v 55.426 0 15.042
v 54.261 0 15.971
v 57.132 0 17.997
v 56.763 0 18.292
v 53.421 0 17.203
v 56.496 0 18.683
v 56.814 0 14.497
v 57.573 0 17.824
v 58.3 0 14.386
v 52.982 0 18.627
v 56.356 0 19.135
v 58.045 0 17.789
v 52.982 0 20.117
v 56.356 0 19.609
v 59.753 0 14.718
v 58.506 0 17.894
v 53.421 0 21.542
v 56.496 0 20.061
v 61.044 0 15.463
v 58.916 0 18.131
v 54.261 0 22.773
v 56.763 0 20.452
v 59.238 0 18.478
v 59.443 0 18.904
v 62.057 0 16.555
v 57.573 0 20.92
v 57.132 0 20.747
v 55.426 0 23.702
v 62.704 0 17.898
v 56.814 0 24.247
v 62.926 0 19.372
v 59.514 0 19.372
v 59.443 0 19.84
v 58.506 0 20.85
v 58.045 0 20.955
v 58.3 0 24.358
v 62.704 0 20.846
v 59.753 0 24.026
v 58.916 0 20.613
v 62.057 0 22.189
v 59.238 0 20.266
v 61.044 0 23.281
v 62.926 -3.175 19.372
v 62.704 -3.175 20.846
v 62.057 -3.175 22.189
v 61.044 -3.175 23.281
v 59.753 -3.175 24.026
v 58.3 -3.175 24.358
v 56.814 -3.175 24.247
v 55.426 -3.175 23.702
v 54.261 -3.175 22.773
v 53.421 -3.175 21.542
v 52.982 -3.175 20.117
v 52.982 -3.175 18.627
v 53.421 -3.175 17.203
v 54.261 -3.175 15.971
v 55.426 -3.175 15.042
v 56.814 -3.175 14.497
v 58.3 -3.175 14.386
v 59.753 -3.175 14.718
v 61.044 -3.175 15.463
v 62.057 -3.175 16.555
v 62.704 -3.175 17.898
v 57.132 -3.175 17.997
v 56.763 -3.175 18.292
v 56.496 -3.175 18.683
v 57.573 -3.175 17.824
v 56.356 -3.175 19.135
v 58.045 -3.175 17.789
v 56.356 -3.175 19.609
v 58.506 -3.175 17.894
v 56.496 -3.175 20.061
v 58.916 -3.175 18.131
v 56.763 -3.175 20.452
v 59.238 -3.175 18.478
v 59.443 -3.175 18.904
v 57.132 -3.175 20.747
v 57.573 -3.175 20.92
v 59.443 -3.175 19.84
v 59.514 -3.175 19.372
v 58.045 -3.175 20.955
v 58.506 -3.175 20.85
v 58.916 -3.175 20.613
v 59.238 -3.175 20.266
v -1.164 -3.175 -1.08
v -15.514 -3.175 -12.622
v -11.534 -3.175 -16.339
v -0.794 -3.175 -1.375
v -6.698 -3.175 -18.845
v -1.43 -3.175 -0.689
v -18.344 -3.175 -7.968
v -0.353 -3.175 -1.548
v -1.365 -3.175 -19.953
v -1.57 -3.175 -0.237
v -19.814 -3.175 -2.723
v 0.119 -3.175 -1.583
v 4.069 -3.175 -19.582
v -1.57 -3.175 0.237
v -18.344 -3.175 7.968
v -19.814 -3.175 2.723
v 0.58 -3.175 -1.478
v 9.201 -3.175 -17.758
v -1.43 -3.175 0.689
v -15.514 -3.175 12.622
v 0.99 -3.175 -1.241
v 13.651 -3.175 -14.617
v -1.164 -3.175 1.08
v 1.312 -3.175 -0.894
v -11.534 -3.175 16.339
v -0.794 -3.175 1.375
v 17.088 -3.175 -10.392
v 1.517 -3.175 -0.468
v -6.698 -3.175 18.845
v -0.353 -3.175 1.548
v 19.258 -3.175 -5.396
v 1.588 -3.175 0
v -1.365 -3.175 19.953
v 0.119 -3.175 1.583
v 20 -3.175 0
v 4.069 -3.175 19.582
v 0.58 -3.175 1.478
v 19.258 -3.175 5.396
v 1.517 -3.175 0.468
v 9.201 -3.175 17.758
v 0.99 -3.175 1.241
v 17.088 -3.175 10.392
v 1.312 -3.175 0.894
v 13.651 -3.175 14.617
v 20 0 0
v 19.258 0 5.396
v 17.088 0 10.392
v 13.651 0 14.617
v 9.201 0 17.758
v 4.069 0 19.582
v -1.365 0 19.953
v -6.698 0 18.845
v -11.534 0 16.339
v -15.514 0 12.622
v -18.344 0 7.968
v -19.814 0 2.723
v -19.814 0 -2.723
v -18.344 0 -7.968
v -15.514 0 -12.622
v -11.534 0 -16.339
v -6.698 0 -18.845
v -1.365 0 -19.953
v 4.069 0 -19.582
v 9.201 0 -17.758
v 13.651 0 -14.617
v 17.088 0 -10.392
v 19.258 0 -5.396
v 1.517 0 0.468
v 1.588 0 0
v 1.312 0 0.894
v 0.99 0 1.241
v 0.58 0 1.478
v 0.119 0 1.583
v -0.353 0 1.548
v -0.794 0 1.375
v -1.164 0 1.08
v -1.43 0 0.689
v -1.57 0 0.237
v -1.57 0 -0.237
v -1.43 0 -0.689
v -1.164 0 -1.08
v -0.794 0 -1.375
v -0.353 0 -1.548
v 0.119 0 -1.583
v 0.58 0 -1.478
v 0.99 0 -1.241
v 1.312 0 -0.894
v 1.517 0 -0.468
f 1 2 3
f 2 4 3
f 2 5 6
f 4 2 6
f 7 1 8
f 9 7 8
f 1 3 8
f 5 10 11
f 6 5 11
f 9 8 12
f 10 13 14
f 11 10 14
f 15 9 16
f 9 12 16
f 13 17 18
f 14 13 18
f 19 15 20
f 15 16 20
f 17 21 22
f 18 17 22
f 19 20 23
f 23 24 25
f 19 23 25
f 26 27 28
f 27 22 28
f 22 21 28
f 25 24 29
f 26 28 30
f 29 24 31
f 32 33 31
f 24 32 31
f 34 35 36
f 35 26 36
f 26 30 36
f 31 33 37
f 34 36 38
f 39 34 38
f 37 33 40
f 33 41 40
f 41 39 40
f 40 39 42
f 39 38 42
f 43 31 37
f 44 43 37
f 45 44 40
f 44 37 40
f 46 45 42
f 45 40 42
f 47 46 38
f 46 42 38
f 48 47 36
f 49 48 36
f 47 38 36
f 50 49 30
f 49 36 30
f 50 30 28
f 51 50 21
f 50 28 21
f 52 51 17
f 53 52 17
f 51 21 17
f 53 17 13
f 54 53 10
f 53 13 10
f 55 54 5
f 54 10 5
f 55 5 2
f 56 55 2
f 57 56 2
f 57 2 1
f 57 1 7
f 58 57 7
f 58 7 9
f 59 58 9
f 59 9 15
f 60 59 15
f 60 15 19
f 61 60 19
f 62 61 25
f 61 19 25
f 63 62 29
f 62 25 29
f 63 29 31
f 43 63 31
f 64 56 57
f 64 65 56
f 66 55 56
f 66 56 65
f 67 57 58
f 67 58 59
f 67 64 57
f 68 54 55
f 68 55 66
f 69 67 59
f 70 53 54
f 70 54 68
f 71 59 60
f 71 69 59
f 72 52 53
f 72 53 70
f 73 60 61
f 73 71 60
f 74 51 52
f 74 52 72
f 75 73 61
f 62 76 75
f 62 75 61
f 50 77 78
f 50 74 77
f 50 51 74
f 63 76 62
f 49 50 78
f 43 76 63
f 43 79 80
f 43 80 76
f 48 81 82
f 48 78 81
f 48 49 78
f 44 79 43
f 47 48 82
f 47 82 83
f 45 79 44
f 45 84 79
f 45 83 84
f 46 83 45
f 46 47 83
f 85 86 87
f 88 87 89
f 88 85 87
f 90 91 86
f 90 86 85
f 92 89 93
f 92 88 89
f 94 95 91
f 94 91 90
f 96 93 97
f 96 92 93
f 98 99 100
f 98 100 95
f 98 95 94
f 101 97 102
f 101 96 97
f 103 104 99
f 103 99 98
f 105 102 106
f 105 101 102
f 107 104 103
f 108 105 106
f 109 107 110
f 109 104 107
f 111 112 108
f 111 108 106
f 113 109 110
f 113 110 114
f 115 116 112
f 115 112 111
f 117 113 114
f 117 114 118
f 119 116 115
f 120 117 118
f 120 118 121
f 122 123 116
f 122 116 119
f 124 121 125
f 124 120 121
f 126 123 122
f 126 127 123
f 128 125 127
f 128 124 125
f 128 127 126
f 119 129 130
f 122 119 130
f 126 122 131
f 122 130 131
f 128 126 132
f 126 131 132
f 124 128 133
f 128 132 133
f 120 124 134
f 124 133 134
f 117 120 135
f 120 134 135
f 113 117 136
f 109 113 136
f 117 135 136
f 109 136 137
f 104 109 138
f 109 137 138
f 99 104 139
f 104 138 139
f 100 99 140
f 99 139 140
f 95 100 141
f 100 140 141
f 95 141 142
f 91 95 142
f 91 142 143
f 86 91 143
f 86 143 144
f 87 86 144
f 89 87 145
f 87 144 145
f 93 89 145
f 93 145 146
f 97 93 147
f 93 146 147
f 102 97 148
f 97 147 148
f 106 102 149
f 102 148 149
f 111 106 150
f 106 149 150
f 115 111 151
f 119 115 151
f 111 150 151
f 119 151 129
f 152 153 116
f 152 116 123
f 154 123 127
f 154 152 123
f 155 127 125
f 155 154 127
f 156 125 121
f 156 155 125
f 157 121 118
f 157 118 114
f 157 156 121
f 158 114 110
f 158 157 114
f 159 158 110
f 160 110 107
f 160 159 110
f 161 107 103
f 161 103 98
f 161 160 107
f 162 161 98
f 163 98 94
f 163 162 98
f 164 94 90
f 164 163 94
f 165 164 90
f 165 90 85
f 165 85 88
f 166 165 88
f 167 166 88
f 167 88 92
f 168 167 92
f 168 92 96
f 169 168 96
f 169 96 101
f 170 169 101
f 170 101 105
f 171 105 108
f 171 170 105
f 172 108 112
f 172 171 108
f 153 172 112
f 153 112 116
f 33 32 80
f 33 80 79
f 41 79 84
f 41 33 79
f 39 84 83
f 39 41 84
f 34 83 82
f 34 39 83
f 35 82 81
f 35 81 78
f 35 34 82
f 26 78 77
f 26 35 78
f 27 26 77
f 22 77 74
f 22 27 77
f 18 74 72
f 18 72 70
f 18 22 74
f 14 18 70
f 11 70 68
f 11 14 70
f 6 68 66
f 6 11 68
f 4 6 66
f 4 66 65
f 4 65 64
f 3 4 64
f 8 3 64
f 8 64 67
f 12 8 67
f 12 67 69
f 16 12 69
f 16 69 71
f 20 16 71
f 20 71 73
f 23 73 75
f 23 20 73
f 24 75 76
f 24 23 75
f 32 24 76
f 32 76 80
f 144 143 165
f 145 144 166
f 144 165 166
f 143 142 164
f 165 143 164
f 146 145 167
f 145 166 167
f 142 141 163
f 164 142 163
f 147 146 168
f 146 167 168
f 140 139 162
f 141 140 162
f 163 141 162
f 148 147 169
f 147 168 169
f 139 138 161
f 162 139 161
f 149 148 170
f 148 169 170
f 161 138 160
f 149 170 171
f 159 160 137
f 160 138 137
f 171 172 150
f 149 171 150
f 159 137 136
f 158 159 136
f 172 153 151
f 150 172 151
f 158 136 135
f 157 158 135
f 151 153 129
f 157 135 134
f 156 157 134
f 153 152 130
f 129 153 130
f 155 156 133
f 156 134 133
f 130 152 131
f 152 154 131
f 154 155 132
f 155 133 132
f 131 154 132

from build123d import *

# Parameters (mm, degrees)
F0_R     = 20
F0_R_2   = 1.5875
F1_DEPTH = 3.175
F2_R     = 5
F2_R_2   = 1.5875
F3_DEPTH = 3.175


# Not quite as in the source:
# - a length typed as a fraction of an inch, garbled in the dataset ("3 / 203.2 mm" for 3/8 in), is restored


with BuildPart() as f1:
    # F0 (on Front) → F1 (new body)
    with BuildSketch(Plane.XZ):
        Circle(F0_R)
        Circle(F0_R_2, mode=Mode.SUBTRACT)
    extrude(amount=F1_DEPTH)


with BuildPart() as f3:
    # F2 (on Front) → F3 (new body)
    with BuildSketch(Plane.XZ):
        with Locations((57.926248759, 19.372086972)):
            Circle(F2_R)
        with Locations((57.926248759, 19.372086972)):
            Circle(F2_R_2, mode=Mode.SUBTRACT)
    extrude(amount=F3_DEPTH)


solid = Compound([f1.part, f3.part])
